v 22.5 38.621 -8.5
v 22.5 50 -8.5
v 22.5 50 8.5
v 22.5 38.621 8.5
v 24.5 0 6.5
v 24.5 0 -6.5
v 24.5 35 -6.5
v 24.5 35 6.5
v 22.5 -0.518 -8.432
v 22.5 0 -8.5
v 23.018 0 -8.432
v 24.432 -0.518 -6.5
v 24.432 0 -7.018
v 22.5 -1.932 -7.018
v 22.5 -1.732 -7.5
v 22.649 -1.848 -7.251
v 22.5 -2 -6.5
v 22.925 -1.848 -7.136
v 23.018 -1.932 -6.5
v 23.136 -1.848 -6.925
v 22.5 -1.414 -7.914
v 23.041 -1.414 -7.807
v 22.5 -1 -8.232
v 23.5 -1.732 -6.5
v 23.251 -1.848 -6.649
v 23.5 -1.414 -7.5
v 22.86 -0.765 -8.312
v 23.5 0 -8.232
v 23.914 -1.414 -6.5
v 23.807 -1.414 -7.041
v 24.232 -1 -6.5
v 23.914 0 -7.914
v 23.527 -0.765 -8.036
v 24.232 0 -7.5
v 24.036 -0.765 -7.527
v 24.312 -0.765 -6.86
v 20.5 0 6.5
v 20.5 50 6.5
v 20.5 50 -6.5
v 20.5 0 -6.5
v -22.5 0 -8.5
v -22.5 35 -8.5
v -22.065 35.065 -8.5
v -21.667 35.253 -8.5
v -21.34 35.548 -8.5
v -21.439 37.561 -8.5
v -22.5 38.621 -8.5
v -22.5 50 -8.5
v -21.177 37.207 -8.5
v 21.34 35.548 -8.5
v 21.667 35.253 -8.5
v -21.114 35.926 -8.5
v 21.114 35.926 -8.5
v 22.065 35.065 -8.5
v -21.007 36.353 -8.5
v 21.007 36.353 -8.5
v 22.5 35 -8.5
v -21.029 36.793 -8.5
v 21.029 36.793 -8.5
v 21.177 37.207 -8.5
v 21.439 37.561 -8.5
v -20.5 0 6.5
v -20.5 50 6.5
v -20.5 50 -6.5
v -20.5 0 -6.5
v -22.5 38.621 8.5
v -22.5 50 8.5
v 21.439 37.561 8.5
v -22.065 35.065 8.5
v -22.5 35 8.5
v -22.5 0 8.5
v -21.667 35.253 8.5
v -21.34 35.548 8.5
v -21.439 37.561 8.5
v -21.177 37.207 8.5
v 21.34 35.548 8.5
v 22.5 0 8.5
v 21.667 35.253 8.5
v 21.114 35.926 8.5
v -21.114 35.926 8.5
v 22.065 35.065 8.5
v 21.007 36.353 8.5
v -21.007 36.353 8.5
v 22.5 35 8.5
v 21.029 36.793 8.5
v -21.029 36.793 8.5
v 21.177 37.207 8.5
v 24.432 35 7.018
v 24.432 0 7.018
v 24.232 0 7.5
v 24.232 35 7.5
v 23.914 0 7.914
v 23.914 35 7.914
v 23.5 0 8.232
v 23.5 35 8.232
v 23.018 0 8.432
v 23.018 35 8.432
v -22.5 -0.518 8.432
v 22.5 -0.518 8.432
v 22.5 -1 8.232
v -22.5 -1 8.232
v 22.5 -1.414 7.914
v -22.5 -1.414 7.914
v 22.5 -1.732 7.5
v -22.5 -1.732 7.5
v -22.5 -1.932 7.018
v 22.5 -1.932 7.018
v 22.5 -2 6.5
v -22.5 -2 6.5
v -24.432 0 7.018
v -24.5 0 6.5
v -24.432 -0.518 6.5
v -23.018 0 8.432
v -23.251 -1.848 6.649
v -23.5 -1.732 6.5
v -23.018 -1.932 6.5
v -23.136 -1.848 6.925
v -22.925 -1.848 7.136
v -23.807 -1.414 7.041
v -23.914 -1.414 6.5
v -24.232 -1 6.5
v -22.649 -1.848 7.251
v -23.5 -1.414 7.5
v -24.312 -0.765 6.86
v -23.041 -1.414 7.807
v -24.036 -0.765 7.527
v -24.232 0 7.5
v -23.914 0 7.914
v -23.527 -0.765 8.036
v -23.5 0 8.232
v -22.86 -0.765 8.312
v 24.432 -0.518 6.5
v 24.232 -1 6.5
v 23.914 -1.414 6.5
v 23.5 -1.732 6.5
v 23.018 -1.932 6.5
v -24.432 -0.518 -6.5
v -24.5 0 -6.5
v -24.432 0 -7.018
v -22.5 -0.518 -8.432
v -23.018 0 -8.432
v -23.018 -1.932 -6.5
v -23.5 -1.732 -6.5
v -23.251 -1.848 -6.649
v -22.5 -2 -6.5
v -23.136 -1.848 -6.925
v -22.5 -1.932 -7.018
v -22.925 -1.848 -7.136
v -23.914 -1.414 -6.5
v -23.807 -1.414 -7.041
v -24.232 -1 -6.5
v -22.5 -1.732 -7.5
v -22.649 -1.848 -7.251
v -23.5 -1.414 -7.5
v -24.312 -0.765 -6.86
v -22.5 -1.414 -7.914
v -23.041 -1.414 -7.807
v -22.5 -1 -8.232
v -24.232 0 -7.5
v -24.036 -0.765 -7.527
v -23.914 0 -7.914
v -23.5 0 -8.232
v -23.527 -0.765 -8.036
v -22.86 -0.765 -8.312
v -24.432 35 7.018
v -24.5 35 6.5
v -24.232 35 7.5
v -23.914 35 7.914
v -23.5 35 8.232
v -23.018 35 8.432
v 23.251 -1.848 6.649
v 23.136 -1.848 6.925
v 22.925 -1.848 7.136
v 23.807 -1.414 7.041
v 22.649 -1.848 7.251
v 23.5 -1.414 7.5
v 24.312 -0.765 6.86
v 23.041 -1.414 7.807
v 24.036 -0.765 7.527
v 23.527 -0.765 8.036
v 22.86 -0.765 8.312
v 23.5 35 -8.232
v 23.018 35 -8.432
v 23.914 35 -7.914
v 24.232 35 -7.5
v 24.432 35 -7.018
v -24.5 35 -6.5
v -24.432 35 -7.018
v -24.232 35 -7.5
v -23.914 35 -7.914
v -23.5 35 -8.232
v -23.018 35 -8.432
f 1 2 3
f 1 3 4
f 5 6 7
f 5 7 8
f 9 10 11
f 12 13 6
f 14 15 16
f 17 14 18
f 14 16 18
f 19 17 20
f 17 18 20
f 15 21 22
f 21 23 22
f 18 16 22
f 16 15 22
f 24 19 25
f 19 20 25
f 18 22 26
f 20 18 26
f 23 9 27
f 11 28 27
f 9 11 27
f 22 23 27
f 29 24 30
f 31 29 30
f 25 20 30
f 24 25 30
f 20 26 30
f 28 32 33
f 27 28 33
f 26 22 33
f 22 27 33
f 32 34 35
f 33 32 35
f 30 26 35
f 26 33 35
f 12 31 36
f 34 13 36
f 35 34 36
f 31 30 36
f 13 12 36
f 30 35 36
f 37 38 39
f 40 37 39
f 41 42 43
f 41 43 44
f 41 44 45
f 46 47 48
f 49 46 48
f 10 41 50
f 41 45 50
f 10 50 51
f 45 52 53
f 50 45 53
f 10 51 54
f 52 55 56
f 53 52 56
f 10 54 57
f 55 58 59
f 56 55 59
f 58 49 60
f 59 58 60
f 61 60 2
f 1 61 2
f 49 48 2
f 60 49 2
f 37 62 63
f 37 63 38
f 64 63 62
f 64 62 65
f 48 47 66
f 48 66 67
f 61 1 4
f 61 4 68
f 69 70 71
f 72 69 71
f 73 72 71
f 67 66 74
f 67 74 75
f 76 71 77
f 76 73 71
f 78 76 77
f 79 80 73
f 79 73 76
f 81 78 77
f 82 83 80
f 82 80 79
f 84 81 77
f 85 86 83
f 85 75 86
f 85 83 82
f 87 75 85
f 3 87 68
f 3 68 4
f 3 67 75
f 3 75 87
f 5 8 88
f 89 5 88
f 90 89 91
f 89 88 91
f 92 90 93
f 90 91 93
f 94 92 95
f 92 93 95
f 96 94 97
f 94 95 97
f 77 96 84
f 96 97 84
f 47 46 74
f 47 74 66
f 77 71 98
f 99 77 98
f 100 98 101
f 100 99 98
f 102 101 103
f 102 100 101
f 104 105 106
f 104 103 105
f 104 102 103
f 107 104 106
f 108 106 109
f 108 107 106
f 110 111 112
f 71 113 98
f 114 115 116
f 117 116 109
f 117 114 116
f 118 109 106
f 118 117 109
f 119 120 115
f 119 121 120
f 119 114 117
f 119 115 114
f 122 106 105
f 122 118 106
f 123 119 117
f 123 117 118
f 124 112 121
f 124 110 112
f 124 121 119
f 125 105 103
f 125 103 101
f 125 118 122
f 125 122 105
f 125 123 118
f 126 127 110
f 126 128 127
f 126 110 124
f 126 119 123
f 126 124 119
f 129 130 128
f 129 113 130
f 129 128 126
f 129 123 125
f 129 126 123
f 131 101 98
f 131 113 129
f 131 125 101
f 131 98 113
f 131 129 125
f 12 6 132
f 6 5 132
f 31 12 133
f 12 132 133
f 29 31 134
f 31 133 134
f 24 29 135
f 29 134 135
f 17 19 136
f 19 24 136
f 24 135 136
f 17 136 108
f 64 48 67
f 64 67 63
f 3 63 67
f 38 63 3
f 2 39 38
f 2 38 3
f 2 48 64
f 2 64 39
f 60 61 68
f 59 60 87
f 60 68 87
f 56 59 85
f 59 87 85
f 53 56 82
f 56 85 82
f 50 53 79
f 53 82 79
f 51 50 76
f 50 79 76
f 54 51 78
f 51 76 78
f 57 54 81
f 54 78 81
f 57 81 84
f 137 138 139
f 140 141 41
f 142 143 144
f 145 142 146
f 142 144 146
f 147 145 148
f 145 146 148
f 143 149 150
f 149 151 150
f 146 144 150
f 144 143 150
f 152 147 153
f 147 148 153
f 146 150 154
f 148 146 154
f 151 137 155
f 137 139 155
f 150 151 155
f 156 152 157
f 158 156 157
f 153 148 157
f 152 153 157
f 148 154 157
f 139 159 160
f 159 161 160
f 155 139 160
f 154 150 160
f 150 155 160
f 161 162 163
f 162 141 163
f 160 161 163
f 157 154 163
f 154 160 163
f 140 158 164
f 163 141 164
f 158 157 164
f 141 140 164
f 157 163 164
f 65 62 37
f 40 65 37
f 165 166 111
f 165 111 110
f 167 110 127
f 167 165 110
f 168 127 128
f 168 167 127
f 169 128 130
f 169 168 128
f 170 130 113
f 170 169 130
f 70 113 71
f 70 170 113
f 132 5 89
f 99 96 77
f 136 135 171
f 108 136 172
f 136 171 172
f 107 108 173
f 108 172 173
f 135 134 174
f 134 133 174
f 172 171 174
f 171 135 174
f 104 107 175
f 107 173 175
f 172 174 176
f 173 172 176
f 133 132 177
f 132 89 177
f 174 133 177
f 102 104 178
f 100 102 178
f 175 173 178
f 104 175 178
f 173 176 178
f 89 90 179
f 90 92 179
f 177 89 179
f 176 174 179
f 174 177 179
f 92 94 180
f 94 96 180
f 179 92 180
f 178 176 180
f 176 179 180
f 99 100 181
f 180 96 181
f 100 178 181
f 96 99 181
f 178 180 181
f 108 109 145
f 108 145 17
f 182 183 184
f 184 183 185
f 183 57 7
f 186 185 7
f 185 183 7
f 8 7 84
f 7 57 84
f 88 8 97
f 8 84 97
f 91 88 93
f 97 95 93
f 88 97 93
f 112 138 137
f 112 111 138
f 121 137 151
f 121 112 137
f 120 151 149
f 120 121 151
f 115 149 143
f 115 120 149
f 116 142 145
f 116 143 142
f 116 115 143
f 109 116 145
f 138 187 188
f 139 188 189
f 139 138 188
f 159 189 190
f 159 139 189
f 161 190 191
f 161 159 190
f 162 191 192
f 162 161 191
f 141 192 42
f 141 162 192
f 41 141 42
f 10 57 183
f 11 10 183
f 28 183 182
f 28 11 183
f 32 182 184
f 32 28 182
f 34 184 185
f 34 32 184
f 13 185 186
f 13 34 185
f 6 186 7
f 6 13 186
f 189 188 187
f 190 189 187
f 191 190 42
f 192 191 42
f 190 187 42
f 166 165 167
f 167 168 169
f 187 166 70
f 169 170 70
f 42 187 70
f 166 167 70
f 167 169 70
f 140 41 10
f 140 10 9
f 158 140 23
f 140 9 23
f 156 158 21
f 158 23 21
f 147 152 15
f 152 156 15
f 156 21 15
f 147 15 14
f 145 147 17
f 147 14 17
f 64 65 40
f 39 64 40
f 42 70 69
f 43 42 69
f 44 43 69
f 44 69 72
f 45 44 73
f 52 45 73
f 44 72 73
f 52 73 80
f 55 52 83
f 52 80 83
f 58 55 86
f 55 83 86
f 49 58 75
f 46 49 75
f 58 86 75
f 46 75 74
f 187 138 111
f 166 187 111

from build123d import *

# Parameters (mm, degrees)
SKETCH1_W          = 49
SKETCH1_H          = 17
SKETCH1_W_2        = 41
SKETCH1_H_2        = 13
EXTRUDE1_DEPTH     = 50
CUT_EXTRUDE3_DEPTH = 21
SKETCH3_W          = 49
SKETCH3_H          = 17
EXTRUDE2_DEPTH     = 2
FILLET1_R          = 2


with BuildPart() as part:
    # Sketch1 → Extrude1 (new body)
    with BuildSketch(Plane(origin=(0, 0, 0), x_dir=(1, 0, 0), z_dir=(0, 1, 0))):
        Rectangle(SKETCH1_W, SKETCH1_H)
        Rectangle(SKETCH1_W_2, SKETCH1_H_2, mode=Mode.SUBTRACT)
    extrude(amount=EXTRUDE1_DEPTH)

    # Sketch2 → Cut-Extrude3 (cut)
    with BuildSketch(Plane.XY.offset(8.5)):
        with BuildLine():
            Line((-21.439339828, 37.560660172), (-22.5, 38.621320344))
            Line((-22.5, 38.621320344), (-22.5, 50))
            Line((-22.5, 50), (-24.5, 50))
            Line((-24.5, 50), (-24.5, 35))
            Line((-24.5, 35), (-22.5, 35))
            ThreePointArc((-22.5, 35), (-21.114180701, 35.925974851), (-21.439339828, 37.560660172))
        make_face()
        with BuildLine():
            Line((24.5, 50), (22.5, 50))
            Line((22.5, 50), (22.5, 38.621320344))
            Line((22.5, 38.621320344), (21.439339828, 37.560660172))
            ThreePointArc((21.439339828, 37.560660172), (21.114180701, 35.925974851), (22.5, 35))
            Line((22.5, 35), (24.5, 35))
            Line((24.5, 35), (24.5, 50))
        make_face()
    extrude(amount=-CUT_EXTRUDE3_DEPTH, mode=Mode.SUBTRACT)

    # Sketch3 → Extrude2 (add)
    with BuildSketch(Plane.XZ):
        Rectangle(SKETCH3_W, SKETCH3_H)
    extrude(amount=EXTRUDE2_DEPTH)

    # Fillet1
    fillet1_edges = [part.edges().sort_by_distance(p)[0] for p in [
        (-24.5, 16.5, -8.5),
        (-24.5, 16.5, 8.5),
        (24.5, 16.5, -8.5),
        (24.5, 16.5, 8.5),
        (-24.5, -2, 0),
        (0, -2, -8.5),
        (24.5, -2, 0),
        (0, -2, 8.5),
    ]]
    fillet(fillet1_edges, radius=FILLET1_R)


solid = part.part
